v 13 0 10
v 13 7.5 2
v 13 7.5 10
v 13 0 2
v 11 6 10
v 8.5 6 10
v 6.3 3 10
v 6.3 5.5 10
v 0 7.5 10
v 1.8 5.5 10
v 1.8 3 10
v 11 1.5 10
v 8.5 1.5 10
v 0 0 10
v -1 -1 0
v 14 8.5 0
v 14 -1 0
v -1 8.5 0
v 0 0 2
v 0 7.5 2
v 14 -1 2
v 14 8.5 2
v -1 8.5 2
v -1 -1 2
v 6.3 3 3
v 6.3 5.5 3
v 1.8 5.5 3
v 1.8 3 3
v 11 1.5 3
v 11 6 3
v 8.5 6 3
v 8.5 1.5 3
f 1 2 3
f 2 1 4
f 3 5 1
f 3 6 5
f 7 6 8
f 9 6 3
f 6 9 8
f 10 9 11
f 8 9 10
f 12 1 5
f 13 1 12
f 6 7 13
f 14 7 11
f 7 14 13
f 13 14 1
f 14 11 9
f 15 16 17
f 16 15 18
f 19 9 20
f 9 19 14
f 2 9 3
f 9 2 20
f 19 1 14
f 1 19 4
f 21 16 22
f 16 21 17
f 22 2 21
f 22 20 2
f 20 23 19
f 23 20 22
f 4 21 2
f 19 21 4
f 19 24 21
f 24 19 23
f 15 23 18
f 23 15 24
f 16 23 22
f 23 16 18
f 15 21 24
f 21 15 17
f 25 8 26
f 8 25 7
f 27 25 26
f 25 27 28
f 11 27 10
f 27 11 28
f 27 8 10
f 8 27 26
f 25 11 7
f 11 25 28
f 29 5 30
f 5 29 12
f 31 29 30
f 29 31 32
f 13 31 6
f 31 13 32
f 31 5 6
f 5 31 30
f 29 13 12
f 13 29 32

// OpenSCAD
difference(){
	union(){
		cube([13,7.5,10]);
		translate([-1,-1,0])cube([15,9.5,2]);
	}
	union(){
		translate([1.8,3,3])cube([4.5,2.5,10]);
		translate([8.5,1.5,3])cube([2.5,4.5,10]);
	}
}
